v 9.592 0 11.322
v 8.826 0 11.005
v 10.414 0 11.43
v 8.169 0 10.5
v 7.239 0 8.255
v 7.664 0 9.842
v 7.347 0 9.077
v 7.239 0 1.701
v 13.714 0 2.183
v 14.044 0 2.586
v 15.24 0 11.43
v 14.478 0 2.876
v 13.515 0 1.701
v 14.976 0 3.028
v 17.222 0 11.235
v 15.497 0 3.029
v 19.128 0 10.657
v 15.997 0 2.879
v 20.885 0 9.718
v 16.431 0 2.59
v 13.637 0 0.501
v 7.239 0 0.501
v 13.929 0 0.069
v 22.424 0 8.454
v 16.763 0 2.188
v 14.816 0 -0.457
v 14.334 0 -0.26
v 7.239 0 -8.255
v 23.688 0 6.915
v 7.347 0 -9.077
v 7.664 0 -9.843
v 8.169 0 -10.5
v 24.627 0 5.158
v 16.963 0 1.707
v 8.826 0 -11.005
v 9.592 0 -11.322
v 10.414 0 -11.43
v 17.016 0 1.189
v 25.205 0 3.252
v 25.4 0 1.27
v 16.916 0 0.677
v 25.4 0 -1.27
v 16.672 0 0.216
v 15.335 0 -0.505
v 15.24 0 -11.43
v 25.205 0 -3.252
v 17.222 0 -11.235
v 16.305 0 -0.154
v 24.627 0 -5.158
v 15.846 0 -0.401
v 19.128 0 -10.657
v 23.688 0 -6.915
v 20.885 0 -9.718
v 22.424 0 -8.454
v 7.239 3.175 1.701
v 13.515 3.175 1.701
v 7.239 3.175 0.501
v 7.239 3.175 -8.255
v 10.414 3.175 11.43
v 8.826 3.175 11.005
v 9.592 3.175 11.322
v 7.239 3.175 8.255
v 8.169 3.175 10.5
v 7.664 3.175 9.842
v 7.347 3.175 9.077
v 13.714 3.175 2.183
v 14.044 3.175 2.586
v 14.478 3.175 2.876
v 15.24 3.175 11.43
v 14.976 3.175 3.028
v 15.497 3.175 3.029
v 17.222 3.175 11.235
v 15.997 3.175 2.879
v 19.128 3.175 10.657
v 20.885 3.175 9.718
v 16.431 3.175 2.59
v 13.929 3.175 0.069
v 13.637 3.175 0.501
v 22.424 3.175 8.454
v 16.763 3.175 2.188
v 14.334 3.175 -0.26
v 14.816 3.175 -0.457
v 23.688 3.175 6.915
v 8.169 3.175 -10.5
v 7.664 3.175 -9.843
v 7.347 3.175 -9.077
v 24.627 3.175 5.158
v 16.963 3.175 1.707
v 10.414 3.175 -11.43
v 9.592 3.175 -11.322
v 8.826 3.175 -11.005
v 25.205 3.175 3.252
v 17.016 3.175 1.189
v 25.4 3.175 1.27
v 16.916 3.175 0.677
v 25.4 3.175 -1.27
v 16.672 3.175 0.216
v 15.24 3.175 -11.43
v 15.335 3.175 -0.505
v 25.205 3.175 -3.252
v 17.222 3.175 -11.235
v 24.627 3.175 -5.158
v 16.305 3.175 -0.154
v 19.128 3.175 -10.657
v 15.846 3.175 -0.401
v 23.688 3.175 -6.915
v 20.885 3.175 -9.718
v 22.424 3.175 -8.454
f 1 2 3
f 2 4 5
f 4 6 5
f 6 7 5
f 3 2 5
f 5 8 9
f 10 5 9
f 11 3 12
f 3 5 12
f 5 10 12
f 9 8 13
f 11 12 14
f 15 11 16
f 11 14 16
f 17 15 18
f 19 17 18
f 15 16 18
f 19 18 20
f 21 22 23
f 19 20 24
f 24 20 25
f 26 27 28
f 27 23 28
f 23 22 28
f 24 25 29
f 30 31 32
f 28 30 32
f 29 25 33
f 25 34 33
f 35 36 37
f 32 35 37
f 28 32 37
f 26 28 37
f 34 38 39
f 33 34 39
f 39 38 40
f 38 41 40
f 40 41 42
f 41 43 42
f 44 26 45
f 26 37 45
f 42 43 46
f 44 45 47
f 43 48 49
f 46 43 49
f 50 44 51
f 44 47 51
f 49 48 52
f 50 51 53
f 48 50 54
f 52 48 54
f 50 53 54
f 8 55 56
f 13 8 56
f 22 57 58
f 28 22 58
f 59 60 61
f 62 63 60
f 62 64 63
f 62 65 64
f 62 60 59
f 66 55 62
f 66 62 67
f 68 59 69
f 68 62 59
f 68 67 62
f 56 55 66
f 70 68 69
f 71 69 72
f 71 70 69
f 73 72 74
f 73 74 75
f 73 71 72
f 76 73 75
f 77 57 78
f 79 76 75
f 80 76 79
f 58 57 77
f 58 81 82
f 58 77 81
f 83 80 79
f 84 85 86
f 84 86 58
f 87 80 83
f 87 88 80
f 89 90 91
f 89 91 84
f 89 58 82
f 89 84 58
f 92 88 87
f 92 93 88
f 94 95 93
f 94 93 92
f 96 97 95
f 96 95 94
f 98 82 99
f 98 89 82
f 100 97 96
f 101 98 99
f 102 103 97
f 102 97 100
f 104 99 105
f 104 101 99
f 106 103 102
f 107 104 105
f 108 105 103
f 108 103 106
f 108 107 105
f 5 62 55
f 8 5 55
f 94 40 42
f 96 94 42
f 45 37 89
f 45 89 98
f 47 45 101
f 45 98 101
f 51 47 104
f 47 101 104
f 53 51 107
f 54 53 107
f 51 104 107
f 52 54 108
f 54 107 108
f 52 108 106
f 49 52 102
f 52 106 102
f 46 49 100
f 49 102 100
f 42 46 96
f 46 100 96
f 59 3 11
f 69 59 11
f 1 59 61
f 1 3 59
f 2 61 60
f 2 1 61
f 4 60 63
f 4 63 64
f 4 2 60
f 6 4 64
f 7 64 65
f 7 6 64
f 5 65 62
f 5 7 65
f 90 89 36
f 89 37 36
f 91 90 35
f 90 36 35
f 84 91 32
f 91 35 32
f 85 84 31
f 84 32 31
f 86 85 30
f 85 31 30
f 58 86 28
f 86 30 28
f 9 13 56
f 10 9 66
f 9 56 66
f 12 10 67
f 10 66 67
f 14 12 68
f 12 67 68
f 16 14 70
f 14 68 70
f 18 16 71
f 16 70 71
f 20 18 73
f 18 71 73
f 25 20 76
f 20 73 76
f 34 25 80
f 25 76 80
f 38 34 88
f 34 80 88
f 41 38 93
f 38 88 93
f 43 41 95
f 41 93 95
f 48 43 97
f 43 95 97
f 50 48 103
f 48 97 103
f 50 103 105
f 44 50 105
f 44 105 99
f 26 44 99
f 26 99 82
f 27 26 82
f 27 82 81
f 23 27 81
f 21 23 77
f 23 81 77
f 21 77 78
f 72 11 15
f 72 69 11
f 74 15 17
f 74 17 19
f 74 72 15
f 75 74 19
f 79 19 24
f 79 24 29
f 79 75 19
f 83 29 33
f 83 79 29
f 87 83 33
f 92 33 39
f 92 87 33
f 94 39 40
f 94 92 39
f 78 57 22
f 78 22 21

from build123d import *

# Parameters (mm, degrees)
SKETCH1_W           = 50.8
SKETCH1_H           = 22.86
BOSS_EXTRUDE1_DEPTH = 3.175
FILLET1_R           = 10.16
SKETCH3_R           = 1.778
CUT_EXTRUDE1_DEPTH  = 29.033649869
FILLET3_R           = 10.16
SKETCH4_W           = 32.639
SKETCH4_H           = 22.86
CUT_EXTRUDE2_DEPTH  = 29.033649869
FILLET9_R           = 3.175
SKETCH5_W           = 6.800031064
SKETCH5_H           = 1.2
CUT_EXTRUDE4_DEPTH  = 29.033649869


with BuildPart() as part:
    # Sketch1 → Boss-Extrude1 (new body)
    with BuildSketch(Plane(origin=(0, 0, 0), x_dir=(1, 0, 0), z_dir=(0, 1, 0))):
        Rectangle(SKETCH1_W, SKETCH1_H)
    extrude(amount=BOSS_EXTRUDE1_DEPTH)

    # Fillet1
    fillet1_edges = [part.edges().sort_by_distance(p)[0] for p in [
        (25.4, 1.5875, 11.43),
        (-25.4, 1.5875, 11.43),
    ]]
    fillet(fillet1_edges, radius=FILLET1_R)

    # Sketch3 → Cut-Extrude1 (cut, through all)
    with BuildSketch(Plane(origin=(0, 3.175, 0), x_dir=(1, 0, 0), z_dir=(0, 1, 0))):
        with Locations(Location((15.24, -1.27, 0), (0, 0, 270))):
            Circle(SKETCH3_R)
        with Locations(Location((-3.81, -1.27, 0), (0, 0, 270))):
            Circle(SKETCH3_R)
    extrude(amount=-CUT_EXTRUDE1_DEPTH, mode=Mode.SUBTRACT)

    # Fillet3
    fillet3_edges = [part.edges().sort_by_distance(p)[0] for p in [
        (-25.4, 1.5875, -11.43),
        (25.4, 1.5875, -11.43),
    ]]
    fillet(fillet3_edges, radius=FILLET3_R)

    # Sketch4 → Cut-Extrude2 (cut, through all)
    with BuildSketch(Plane(origin=(0, 3.175, 0), x_dir=(1, 0, 0), z_dir=(0, 1, 0))):
        with Locations((-9.0805, 0)):
            Rectangle(SKETCH4_W, SKETCH4_H)
    extrude(amount=-CUT_EXTRUDE2_DEPTH, mode=Mode.SUBTRACT)

    # Fillet9
    fillet9_edges = [part.edges().sort_by_distance(p)[0] for p in [
        (7.239, 1.5875, -11.43),
        (7.239, 1.5875, 11.43),
    ]]
    fillet(fillet9_edges, radius=FILLET9_R)

    # Sketch5 → Cut-Extrude4 (cut, through all)
    with BuildSketch(Plane(origin=(0, 3.175, 0), x_dir=(1, 0, 0), z_dir=(0, 1, 0))):
        with Locations((10.639015532, -1.100889409)):
            Rectangle(SKETCH5_W, SKETCH5_H)
    extrude(amount=-CUT_EXTRUDE4_DEPTH, mode=Mode.SUBTRACT)


solid = part.part
